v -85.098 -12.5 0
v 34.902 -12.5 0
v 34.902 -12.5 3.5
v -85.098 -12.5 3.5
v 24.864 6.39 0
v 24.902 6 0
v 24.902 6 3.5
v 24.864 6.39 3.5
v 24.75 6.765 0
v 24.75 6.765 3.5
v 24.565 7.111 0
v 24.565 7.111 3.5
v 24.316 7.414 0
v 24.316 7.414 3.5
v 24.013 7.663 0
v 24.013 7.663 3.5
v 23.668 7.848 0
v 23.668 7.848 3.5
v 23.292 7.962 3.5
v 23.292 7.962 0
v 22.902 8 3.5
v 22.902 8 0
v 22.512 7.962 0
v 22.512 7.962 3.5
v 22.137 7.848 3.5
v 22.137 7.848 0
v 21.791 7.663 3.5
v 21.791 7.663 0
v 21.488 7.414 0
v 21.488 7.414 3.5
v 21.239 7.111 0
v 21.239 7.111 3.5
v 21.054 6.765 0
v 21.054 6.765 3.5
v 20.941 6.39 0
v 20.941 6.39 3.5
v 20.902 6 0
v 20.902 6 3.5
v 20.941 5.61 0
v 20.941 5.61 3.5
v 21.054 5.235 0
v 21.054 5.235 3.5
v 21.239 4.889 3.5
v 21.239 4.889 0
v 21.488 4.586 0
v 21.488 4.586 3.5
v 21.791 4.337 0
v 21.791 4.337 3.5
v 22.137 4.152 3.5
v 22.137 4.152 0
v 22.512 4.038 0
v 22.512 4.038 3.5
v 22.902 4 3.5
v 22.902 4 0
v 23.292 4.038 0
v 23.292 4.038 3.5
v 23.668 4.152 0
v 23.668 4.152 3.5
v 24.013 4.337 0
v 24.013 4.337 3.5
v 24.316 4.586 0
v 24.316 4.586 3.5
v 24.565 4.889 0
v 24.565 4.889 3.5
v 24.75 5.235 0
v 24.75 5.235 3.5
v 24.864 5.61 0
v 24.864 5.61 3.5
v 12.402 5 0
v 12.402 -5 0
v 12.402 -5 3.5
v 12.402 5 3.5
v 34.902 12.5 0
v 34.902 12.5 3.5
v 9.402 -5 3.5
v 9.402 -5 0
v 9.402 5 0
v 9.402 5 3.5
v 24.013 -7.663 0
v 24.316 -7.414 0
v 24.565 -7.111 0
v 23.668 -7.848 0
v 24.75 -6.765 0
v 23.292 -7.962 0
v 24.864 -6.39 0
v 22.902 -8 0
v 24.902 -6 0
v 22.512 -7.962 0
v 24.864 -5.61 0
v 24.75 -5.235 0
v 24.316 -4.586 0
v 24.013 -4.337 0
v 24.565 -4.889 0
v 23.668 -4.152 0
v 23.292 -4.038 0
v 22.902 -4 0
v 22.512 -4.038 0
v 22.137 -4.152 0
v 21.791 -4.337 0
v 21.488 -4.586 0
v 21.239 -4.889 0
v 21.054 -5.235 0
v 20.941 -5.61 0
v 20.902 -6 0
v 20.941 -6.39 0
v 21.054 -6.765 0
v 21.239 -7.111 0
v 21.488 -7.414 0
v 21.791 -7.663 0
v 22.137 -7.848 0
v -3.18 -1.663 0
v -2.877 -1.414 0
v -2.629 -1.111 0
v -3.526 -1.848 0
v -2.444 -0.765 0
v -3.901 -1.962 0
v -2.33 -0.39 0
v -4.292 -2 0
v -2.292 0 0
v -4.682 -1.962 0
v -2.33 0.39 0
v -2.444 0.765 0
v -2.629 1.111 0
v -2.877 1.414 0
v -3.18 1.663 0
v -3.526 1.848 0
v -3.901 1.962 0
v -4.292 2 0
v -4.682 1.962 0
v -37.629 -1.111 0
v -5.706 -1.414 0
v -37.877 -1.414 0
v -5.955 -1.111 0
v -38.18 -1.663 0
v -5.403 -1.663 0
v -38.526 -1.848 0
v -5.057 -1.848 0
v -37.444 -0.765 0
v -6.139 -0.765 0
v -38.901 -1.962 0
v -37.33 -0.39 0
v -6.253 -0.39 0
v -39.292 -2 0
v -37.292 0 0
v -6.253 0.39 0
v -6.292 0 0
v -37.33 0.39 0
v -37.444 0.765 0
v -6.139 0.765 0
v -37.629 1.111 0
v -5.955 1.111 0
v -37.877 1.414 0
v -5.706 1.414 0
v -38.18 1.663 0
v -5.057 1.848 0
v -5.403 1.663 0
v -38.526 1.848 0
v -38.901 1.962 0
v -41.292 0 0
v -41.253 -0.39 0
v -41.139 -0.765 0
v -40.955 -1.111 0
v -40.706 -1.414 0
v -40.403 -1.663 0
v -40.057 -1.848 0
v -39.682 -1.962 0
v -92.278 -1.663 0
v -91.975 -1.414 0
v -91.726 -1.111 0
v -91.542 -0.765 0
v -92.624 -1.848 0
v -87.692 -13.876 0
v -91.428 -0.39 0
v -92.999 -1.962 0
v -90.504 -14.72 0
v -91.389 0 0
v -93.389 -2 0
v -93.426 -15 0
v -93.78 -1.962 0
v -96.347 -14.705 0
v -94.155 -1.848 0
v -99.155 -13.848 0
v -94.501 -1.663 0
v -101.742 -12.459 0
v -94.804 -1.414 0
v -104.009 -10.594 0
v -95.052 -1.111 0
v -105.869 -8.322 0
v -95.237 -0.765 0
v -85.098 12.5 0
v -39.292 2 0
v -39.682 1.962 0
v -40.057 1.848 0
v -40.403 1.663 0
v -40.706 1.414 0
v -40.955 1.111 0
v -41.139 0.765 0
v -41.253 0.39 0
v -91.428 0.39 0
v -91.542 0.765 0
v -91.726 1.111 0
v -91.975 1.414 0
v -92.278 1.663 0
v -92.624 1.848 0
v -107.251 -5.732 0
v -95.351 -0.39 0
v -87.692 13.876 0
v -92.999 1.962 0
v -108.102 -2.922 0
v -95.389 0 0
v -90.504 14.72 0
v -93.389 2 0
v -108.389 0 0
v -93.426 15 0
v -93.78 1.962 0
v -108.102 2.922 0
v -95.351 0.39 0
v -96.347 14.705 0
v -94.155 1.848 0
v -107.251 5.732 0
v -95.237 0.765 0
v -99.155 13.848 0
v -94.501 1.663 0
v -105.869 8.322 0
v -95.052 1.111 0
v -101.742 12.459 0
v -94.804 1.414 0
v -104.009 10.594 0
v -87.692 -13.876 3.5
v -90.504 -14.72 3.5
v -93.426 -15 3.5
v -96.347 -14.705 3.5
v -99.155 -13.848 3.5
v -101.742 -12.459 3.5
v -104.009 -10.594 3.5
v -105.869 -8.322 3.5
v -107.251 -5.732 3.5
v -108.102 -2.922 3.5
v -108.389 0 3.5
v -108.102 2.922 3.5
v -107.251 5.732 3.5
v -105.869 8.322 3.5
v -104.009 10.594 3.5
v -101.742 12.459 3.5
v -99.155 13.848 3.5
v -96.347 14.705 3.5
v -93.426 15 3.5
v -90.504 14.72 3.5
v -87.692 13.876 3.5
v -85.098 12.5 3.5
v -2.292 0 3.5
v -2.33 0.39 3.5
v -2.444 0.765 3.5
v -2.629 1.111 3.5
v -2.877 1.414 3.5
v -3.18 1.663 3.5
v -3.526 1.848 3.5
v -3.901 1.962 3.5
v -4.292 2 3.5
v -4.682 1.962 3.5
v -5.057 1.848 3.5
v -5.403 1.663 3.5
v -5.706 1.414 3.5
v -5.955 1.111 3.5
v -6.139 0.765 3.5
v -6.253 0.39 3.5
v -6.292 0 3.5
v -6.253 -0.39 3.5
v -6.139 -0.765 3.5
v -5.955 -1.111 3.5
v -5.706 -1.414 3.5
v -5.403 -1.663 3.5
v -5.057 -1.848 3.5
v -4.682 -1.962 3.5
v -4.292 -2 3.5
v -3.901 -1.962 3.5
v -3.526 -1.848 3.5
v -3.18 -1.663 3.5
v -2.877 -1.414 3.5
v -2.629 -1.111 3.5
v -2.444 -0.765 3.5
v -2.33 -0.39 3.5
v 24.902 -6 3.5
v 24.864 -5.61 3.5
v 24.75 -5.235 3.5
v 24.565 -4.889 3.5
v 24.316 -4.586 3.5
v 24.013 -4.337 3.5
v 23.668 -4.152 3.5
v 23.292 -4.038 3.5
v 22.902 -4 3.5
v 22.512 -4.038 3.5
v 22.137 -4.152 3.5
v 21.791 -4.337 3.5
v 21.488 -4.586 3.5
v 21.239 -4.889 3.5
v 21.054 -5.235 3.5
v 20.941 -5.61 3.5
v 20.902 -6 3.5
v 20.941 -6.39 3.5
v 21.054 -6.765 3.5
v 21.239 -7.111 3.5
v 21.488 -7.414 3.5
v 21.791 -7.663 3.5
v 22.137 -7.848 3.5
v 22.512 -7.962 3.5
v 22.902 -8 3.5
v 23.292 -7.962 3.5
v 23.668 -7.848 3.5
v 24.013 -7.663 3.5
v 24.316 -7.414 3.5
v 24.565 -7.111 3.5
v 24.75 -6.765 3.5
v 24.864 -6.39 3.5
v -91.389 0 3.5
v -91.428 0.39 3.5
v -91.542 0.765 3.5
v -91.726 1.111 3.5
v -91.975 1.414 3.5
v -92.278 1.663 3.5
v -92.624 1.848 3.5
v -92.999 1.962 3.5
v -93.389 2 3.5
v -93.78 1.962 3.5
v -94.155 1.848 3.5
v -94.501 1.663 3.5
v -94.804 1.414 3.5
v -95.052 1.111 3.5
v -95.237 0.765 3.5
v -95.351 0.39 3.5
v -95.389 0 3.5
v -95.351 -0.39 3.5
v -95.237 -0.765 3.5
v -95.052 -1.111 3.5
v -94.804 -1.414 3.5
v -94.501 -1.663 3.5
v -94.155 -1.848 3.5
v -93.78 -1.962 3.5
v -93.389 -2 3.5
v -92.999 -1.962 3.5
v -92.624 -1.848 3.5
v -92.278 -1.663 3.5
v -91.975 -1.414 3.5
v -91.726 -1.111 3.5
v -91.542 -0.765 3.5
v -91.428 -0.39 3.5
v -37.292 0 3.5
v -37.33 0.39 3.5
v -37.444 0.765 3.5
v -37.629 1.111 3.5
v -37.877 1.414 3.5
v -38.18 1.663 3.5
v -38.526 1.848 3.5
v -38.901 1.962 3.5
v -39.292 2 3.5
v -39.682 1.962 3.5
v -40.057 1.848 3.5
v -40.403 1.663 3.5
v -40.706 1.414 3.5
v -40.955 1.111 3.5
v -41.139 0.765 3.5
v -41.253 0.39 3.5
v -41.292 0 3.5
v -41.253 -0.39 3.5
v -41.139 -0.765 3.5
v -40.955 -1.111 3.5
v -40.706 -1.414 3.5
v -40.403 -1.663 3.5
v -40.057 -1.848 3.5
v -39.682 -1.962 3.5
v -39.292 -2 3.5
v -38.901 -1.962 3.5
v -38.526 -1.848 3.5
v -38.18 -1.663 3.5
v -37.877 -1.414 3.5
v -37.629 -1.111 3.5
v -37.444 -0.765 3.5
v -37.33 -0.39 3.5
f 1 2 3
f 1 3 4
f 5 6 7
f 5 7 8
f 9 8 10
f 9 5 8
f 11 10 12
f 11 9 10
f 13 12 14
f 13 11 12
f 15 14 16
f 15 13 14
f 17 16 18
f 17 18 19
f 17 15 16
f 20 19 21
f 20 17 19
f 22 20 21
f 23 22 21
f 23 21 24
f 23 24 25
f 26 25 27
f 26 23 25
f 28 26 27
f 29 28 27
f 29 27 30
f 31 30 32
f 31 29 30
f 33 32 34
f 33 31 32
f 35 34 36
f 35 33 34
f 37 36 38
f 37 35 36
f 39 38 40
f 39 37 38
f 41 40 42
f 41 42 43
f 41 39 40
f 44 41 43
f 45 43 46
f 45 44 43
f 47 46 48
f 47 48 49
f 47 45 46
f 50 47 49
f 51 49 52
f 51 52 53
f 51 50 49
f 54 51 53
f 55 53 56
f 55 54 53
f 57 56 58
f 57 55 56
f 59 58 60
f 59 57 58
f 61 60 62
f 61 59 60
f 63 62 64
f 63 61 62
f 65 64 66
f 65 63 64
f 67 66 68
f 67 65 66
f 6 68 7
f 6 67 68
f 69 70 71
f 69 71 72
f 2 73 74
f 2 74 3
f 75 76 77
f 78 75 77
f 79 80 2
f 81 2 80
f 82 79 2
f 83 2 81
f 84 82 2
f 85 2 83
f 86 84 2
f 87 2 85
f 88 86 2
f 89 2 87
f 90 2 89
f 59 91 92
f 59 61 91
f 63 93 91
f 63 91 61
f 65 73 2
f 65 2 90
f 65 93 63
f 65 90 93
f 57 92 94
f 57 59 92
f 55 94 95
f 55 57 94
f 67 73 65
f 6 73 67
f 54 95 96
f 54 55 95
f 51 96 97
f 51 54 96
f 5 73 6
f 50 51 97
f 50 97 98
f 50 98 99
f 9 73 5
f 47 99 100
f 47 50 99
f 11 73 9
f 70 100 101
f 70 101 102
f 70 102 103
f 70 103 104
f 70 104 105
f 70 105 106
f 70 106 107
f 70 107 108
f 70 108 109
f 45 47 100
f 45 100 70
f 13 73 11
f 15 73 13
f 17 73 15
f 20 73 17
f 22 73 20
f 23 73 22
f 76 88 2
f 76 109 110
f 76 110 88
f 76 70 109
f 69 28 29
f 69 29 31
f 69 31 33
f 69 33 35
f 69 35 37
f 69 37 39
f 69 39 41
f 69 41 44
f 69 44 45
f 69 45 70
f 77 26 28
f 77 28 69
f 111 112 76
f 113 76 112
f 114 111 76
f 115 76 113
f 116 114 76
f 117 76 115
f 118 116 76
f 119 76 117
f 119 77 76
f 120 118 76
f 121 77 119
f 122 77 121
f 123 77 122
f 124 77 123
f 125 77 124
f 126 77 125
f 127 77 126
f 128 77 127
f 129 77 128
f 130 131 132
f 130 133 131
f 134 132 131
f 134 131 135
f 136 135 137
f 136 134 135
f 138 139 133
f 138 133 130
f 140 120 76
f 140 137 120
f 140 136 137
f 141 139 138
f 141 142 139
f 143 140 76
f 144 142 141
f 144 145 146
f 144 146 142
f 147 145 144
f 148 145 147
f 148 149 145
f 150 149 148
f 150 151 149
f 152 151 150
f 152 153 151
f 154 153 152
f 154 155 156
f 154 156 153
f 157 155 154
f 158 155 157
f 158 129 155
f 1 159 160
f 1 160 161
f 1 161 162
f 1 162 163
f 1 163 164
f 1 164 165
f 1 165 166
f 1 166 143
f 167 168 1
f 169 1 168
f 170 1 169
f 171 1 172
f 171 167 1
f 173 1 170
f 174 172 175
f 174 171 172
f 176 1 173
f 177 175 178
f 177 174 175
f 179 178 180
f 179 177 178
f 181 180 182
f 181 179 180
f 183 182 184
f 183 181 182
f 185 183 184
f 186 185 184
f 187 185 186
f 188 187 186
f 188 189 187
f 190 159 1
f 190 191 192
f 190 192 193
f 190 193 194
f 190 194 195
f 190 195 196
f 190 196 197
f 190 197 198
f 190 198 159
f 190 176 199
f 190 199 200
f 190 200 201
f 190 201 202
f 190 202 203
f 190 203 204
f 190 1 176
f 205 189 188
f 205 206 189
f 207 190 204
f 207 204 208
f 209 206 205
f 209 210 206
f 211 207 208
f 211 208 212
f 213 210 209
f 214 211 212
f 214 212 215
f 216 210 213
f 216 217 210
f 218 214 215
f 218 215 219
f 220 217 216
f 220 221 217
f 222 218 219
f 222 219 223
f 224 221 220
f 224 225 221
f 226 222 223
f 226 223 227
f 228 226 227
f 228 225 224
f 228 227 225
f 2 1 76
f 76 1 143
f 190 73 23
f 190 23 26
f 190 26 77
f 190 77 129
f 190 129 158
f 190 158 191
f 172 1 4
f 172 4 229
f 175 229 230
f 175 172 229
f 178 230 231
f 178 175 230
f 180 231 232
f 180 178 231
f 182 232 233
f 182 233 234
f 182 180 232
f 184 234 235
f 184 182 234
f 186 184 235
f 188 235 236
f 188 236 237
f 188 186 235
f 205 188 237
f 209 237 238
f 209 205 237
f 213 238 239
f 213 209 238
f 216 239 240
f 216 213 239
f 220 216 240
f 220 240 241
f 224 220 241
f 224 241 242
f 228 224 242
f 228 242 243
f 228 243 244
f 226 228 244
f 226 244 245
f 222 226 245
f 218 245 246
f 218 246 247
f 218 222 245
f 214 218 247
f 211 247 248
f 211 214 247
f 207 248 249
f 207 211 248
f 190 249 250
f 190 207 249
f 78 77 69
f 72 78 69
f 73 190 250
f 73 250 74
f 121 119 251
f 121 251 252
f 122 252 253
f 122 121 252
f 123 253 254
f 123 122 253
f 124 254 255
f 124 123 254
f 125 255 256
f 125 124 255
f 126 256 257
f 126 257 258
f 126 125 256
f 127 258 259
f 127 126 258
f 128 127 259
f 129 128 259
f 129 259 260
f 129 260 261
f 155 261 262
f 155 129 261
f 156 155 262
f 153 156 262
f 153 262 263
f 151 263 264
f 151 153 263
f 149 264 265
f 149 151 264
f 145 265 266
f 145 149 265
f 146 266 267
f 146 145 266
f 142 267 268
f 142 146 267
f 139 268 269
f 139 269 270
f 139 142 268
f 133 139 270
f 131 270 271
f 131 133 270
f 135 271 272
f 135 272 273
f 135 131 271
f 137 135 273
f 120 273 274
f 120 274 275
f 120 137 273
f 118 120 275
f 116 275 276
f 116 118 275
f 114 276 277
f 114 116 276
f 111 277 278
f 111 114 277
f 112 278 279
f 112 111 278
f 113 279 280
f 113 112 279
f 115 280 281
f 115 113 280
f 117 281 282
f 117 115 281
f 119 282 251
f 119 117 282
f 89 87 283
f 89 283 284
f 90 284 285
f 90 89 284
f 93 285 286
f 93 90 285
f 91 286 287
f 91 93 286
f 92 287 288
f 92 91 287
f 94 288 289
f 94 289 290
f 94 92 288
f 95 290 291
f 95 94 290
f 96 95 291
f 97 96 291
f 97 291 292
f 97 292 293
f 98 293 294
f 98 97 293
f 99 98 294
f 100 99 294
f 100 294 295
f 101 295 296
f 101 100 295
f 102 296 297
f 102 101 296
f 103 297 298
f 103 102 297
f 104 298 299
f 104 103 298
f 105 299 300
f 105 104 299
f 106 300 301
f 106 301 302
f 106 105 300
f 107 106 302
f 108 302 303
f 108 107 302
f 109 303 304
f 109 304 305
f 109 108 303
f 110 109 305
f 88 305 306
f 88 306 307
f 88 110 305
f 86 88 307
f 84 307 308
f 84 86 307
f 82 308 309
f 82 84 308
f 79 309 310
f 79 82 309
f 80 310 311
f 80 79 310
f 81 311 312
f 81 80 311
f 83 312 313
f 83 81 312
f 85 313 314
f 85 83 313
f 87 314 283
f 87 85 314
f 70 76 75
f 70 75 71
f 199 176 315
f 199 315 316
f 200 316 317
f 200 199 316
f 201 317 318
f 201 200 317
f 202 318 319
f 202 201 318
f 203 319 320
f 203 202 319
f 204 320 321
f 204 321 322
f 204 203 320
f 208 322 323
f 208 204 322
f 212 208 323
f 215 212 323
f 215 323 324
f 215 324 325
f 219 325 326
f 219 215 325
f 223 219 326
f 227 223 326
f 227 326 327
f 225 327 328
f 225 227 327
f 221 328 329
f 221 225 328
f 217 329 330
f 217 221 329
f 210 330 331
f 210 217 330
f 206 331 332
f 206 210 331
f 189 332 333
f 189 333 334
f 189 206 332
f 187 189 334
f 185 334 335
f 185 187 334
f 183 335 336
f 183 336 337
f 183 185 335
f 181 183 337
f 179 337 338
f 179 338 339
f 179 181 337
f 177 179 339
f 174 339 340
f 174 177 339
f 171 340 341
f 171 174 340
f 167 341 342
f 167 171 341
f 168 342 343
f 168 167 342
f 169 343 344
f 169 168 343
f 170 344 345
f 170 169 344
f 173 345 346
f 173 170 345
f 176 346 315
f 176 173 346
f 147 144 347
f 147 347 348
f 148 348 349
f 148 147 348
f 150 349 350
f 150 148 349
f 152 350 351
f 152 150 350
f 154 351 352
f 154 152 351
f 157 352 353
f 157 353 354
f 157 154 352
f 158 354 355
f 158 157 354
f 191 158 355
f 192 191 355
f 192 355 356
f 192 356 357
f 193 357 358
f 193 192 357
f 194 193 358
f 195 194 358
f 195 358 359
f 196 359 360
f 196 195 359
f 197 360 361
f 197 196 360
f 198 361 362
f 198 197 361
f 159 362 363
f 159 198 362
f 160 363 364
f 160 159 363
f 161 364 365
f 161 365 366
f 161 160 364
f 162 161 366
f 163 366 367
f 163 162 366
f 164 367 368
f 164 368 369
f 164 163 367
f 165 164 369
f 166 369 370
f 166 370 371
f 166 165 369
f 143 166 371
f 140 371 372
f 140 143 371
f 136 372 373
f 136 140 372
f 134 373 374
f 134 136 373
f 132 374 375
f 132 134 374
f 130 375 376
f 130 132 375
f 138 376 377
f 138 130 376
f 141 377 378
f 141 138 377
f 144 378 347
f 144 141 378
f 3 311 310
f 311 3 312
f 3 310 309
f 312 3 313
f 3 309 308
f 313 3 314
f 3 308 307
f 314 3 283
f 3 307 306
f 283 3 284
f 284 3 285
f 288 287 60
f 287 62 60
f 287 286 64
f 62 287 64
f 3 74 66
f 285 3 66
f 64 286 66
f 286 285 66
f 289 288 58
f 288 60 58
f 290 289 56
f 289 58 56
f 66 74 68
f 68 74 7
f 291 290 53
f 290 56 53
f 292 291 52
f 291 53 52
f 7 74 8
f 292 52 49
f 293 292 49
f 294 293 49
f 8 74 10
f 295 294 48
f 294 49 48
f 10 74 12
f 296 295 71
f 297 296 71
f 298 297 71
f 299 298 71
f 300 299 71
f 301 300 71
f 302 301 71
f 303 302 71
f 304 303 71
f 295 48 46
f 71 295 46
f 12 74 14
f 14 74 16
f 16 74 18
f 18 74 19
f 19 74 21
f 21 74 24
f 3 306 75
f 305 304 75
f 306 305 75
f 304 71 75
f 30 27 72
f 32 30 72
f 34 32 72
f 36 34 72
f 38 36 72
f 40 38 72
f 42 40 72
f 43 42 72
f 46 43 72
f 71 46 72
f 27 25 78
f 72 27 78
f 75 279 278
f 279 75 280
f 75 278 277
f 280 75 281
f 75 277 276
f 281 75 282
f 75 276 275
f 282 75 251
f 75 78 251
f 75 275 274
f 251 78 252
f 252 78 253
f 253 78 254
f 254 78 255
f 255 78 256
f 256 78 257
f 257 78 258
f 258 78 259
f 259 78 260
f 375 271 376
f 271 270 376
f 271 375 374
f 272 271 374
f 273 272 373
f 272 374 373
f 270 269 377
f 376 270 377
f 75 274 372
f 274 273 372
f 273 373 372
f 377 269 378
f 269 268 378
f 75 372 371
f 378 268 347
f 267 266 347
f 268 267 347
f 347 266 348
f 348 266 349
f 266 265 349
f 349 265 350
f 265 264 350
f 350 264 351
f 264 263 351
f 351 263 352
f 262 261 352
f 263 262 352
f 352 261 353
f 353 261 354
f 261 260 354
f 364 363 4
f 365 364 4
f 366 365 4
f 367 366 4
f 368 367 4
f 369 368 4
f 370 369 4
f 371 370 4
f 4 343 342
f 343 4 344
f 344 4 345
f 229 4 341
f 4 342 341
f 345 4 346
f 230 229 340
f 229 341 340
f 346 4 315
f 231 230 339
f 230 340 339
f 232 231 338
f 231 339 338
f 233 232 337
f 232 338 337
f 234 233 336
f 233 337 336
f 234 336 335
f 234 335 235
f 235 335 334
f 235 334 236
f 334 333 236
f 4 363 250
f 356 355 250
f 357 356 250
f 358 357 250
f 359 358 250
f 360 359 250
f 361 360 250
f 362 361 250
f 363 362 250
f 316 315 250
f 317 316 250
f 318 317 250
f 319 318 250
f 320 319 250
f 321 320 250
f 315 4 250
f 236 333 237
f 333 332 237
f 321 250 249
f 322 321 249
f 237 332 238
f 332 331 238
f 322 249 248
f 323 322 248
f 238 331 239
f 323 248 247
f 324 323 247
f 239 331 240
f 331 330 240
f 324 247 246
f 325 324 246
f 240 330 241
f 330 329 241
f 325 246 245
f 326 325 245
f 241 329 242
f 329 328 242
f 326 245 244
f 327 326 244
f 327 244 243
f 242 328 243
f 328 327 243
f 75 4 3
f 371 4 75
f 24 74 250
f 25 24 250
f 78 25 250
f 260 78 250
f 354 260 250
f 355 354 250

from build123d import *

# Parameters (mm, degrees)
CROQUIS1_R              = 2
CROQUIS1_W              = 3
CROQUIS1_H              = 10
SALIENTE_EXTRUIR2_DEPTH = 3.5


with BuildPart() as part:
    # Croquis1 → Saliente-Extruir2 (new body)
    with BuildSketch(Plane.XY):
        with BuildLine():
            Line((34.902189702, 12.5), (34.902189702, -12.5))
            Line((34.902189702, -12.5), (-85.097810298, -12.5))
            ThreePointArc((-85.097810298, -12.5), (-108.389372273, 0), (-85.097810298, 12.5))
            Line((-85.097810298, 12.5), (34.902189702, 12.5))
        make_face()
        with Locations((-93.389372273, 0)):
            Circle(CROQUIS1_R, mode=Mode.SUBTRACT)
        with Locations((22.902189702, 6)):
            Circle(CROQUIS1_R, mode=Mode.SUBTRACT)
        with Locations((22.902189702, -6)):
            Circle(CROQUIS1_R, mode=Mode.SUBTRACT)
        with Locations((-39.291561976, 0)):
            Circle(CROQUIS1_R, mode=Mode.SUBTRACT)
        with Locations((-4.291561976, 0)):
            Circle(CROQUIS1_R, mode=Mode.SUBTRACT)
        with Locations((10.902189702, 0)):
            Rectangle(CROQUIS1_W, CROQUIS1_H, mode=Mode.SUBTRACT)
    extrude(amount=SALIENTE_EXTRUIR2_DEPTH)


solid = part.part
